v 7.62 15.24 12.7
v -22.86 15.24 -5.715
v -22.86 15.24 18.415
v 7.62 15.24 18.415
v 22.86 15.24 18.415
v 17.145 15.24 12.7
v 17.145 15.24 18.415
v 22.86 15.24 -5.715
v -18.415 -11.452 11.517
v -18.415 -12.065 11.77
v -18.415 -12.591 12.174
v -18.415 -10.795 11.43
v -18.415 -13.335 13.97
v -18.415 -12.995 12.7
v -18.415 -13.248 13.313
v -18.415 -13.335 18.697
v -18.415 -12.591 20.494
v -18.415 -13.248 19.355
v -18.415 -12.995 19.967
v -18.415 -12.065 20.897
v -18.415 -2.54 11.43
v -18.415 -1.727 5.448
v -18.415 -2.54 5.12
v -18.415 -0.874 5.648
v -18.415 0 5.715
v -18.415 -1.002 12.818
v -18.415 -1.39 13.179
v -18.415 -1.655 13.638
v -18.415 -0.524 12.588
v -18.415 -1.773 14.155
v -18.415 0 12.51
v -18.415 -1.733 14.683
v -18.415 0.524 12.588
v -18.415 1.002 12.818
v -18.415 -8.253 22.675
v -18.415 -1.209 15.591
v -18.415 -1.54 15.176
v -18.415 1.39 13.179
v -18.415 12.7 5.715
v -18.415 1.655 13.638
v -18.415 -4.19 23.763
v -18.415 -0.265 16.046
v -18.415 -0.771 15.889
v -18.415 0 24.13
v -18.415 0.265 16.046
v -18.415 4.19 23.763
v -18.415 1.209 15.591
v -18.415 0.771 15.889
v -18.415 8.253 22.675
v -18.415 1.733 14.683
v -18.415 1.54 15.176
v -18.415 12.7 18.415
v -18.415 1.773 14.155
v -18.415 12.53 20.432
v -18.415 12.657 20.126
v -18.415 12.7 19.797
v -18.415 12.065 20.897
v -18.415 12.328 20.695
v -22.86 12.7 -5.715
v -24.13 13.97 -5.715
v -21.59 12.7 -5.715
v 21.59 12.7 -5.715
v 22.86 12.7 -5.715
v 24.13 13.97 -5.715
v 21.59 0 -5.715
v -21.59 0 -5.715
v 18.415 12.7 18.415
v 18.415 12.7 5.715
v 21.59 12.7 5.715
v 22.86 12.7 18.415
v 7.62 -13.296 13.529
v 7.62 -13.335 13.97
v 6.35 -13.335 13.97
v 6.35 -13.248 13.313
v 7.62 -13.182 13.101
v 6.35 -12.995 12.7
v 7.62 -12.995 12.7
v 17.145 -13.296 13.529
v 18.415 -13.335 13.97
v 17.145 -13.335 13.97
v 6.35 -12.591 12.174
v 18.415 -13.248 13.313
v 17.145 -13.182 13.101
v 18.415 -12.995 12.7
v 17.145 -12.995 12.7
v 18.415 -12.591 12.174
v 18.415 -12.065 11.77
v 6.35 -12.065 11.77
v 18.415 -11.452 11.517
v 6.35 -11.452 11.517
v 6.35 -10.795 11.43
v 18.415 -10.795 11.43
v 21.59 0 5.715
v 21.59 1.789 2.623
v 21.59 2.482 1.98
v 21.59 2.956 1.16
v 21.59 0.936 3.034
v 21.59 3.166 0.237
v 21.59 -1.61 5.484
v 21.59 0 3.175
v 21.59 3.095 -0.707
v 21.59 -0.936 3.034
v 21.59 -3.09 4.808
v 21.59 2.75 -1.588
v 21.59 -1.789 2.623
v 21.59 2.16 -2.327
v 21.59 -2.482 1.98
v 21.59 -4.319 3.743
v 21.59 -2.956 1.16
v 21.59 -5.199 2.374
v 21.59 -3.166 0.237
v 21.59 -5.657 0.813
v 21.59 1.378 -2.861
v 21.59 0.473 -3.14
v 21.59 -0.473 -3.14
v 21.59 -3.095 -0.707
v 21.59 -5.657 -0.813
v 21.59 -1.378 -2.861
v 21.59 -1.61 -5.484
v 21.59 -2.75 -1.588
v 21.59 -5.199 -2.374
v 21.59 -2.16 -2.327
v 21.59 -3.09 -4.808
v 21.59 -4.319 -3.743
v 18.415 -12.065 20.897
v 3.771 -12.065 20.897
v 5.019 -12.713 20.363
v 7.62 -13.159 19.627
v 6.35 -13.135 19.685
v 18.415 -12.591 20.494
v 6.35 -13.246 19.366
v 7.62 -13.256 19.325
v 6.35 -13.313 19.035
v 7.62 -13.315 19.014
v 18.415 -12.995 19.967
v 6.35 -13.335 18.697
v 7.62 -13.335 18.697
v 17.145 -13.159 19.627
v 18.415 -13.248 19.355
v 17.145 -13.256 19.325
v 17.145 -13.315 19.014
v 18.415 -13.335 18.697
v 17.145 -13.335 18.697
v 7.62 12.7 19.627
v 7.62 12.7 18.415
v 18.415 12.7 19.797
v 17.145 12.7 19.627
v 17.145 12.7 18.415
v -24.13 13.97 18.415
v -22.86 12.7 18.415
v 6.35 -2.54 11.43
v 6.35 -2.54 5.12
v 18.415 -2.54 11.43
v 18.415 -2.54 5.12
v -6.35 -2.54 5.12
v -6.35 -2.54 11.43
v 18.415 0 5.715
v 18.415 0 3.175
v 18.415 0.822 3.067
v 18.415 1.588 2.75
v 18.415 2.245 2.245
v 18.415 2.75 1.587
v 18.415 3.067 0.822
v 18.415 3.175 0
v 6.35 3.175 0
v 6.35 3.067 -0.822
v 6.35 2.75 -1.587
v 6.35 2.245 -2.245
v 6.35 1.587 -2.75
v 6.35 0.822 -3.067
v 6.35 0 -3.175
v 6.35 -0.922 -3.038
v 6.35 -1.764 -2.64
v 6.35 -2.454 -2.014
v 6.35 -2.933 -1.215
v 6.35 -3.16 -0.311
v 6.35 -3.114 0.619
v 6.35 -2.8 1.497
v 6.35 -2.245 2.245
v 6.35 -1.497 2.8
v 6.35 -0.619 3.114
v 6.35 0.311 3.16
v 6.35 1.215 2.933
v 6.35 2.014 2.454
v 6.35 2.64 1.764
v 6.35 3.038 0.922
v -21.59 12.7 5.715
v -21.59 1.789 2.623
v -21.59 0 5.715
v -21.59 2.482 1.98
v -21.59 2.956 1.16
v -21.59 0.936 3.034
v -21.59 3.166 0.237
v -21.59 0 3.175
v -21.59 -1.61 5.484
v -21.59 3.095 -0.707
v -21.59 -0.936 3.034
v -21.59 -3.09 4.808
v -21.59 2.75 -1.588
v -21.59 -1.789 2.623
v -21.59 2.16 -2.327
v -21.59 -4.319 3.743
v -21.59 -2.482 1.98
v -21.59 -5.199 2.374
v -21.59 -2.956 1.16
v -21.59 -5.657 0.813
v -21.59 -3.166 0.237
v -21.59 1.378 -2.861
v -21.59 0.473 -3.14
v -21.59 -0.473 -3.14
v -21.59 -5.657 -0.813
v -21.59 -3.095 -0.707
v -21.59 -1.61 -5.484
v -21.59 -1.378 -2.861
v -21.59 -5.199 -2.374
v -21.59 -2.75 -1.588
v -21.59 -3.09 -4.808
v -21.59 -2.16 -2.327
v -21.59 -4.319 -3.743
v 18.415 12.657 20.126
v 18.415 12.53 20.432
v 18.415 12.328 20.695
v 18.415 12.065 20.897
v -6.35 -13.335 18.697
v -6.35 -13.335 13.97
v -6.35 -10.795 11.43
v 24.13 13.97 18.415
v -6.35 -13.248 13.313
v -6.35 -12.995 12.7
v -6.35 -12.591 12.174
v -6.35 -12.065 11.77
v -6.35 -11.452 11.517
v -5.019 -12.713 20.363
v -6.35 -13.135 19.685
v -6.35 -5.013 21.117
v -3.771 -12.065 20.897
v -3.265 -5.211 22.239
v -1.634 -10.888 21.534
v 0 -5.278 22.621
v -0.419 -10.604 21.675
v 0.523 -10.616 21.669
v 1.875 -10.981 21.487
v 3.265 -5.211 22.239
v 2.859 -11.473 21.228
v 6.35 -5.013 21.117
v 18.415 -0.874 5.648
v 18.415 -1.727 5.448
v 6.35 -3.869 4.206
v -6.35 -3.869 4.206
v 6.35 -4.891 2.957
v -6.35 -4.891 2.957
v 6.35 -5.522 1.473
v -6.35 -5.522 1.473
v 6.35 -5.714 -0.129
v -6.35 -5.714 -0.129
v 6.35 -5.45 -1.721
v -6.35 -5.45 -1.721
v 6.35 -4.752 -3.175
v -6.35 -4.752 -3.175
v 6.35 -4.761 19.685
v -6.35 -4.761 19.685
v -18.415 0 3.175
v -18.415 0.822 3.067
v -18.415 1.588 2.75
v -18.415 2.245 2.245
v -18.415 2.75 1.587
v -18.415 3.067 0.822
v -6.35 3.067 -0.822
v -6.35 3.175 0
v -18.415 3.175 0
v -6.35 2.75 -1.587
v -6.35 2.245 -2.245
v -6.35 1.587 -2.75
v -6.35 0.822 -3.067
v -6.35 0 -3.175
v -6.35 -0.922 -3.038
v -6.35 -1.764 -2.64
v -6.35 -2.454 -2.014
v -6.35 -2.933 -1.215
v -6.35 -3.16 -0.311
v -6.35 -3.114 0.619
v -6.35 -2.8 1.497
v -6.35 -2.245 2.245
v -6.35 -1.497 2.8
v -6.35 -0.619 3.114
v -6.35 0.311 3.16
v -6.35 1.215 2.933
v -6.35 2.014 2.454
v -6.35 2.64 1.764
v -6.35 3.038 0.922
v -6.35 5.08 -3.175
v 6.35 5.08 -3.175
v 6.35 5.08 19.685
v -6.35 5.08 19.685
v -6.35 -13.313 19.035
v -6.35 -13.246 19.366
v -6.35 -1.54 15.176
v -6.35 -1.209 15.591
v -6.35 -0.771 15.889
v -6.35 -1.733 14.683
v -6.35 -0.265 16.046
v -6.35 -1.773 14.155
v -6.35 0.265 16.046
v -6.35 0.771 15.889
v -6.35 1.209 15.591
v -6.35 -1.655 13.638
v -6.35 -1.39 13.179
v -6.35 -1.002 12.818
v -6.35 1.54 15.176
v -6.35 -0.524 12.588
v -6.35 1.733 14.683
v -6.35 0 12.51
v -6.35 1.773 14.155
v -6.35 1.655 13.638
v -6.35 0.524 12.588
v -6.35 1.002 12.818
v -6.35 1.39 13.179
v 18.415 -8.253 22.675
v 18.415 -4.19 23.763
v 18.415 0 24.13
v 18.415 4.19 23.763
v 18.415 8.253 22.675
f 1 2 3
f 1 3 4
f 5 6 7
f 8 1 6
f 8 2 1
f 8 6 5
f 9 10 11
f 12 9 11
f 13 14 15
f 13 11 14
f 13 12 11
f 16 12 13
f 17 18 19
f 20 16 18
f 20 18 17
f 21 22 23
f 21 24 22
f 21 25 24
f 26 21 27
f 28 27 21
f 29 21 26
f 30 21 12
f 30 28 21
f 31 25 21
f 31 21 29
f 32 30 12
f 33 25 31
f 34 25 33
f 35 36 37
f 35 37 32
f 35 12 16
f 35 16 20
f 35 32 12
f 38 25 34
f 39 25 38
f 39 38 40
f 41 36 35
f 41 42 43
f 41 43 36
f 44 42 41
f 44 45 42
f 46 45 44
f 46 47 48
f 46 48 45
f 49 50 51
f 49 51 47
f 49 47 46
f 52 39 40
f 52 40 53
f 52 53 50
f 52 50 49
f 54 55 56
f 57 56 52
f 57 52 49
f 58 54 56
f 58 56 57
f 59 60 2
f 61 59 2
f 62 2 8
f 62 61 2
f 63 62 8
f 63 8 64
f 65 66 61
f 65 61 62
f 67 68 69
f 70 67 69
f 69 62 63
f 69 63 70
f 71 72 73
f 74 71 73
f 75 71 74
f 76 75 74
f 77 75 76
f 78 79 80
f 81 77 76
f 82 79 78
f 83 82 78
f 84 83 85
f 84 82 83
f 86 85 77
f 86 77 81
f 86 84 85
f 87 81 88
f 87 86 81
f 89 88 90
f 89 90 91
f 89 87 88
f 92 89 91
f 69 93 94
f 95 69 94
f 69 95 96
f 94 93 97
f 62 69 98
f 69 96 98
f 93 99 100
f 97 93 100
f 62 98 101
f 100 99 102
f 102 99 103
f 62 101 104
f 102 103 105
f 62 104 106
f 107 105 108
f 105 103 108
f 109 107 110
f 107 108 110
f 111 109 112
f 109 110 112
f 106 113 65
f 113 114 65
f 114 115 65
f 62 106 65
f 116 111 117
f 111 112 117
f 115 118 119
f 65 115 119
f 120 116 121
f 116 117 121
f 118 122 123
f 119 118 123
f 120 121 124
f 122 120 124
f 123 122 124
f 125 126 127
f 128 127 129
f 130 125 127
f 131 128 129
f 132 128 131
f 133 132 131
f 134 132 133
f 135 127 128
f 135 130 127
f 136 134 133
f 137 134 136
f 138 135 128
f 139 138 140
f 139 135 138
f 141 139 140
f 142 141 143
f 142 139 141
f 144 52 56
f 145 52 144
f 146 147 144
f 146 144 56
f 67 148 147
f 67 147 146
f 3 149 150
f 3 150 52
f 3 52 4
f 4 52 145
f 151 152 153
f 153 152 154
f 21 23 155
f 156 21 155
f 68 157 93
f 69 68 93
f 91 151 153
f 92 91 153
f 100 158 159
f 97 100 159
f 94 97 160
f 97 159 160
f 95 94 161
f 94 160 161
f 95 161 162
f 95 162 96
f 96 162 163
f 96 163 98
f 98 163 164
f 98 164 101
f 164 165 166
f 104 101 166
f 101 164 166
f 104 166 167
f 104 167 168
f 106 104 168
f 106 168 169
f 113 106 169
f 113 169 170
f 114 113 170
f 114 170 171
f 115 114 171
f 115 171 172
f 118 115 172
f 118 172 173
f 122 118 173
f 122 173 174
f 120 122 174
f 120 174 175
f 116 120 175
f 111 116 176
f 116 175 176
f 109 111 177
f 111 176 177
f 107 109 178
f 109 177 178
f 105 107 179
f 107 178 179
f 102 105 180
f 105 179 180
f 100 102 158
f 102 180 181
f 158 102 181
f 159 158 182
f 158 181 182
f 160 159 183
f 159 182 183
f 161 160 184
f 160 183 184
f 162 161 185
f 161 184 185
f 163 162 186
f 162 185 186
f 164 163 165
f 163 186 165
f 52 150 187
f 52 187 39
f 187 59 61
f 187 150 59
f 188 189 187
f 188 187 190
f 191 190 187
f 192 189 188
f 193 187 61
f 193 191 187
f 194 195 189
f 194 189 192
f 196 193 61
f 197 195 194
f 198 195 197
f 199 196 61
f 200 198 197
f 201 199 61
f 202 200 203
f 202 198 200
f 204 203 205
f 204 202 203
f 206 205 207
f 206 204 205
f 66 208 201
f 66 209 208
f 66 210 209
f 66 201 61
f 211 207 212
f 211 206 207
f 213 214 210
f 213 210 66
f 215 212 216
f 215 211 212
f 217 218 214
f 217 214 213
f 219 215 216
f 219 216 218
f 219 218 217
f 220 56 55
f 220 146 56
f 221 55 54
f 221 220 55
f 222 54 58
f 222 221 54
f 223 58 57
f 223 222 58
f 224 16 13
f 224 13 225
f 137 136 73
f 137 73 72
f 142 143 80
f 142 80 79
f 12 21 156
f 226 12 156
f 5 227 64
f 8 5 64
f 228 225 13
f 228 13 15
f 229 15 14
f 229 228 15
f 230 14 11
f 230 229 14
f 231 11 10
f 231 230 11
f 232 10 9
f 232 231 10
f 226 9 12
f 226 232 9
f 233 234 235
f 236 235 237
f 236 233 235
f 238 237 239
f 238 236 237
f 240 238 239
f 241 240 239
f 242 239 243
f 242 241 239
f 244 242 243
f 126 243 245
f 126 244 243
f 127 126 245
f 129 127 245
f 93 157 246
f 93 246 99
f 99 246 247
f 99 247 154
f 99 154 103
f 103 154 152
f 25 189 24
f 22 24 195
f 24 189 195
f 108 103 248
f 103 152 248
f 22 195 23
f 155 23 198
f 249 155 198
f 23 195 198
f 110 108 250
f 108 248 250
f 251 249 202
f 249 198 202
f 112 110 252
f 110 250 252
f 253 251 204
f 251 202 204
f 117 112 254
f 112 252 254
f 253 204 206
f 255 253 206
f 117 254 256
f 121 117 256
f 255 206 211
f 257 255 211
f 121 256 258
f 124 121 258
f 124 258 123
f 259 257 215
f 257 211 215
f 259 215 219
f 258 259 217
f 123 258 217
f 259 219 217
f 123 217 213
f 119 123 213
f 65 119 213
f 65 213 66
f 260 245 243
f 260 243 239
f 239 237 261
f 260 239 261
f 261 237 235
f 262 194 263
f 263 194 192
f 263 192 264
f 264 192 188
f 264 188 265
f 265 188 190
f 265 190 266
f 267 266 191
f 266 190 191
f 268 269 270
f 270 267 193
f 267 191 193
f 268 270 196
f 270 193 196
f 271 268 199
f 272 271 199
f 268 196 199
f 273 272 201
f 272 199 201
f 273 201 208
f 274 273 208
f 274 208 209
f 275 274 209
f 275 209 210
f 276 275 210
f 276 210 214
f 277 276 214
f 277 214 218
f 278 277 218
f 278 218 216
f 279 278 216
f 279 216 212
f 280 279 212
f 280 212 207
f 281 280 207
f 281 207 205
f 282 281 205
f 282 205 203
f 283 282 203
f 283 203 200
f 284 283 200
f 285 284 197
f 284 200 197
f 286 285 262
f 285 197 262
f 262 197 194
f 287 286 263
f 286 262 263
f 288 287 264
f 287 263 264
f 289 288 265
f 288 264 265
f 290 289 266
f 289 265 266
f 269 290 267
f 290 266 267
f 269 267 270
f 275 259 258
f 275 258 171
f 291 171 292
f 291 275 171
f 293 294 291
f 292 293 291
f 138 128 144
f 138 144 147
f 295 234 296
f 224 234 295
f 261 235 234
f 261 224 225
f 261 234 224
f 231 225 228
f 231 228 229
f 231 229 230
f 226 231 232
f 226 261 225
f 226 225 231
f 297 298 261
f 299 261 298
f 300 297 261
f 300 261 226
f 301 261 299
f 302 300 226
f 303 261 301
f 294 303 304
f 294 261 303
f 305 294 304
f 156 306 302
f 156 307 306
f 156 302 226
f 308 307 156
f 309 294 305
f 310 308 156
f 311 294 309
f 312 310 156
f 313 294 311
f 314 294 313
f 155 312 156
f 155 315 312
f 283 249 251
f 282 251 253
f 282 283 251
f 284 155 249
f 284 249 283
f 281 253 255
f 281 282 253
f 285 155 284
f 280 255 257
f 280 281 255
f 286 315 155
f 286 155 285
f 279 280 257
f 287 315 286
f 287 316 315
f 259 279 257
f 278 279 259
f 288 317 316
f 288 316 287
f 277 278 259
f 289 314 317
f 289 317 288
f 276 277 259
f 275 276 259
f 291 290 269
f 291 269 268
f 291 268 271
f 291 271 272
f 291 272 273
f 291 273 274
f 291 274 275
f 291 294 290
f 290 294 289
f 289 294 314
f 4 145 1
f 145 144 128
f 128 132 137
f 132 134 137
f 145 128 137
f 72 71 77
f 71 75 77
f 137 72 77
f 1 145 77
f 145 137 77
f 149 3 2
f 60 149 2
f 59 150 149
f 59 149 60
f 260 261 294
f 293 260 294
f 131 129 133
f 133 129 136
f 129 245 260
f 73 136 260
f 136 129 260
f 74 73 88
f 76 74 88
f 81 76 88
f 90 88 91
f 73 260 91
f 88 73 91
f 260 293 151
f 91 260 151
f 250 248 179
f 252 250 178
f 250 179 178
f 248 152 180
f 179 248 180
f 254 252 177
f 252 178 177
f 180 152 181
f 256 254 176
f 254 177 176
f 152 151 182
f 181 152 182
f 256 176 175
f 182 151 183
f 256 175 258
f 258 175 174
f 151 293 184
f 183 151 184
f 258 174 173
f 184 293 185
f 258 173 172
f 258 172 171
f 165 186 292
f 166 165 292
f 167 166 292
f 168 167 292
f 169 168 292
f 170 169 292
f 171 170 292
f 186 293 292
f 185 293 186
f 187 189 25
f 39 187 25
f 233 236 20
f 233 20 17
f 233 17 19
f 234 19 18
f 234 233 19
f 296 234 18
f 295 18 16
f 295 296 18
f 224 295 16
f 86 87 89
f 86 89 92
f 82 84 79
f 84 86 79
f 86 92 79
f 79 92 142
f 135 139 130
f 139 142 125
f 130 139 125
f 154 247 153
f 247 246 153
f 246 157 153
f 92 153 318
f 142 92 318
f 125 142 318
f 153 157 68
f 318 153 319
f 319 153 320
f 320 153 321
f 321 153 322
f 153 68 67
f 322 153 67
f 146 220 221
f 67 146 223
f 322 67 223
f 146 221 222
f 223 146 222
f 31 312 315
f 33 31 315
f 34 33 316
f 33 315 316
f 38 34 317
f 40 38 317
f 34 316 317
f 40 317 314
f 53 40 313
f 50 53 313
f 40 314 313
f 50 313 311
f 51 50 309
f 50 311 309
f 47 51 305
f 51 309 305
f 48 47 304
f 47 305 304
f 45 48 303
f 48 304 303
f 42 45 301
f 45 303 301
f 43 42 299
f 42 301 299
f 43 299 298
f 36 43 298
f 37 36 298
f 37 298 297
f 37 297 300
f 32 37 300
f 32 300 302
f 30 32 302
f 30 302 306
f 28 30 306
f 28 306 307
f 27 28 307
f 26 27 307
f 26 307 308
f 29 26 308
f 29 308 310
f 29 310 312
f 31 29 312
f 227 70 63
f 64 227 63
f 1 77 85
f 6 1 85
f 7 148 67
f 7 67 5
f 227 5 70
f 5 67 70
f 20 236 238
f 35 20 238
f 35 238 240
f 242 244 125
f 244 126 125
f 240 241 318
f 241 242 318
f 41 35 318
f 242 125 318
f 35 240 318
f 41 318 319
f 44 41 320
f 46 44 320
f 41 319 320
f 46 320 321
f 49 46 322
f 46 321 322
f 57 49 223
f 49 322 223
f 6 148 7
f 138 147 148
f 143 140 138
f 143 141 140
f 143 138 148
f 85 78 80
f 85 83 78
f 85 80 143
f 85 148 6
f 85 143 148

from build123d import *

# Parameters (mm, degrees)
BOSS_EXTRUDE1_DEPTH      = 21.59
BOSS_EXTRUDE1_DEPTH_BACK = 21.59
SKETCH1_R                = 5.715
SKETCH3_W                = 43.18
SKETCH3_H                = 11.43
BOSS_EXTRUDE3_DEPTH      = 12.7
SKETCH4_W                = 36.83
SKETCH4_H                = 15.24
BOSS_EXTRUDE4_DEPTH      = 24.13
SKETCH7_W                = 36.83
SKETCH7_H                = 12.7
BOSS_EXTRUDE5_DEPTH      = 10.795
SKETCH5_R                = 3.175
CUT_EXTRUDE1_DEPTH       = 52.230767367
CUT_EXTRUDE5_DEPTH       = 52.230767367
FILLET1_R                = 2.54
CUT_EXTRUDE6_DEPTH       = 6.35
CUT_EXTRUDE6_DEPTH_BACK  = 6.35
SKETCH10_W               = 22.86
SKETCH10_H               = 25.4
SKETCH11_R               = 1.778
CUT_EXTRUDE7_DEPTH       = 36.017241825
SKETCH24_W               = 48.26
SKETCH24_H               = 24.13
BOSS_EXTRUDE6_DEPTH      = 2.54
SKETCH17_W               = 12.7
SKETCH17_H               = 3.175
CUT_EXTRUDE9_DEPTH       = 8.89
SKETCH18_W               = 9.525
SKETCH18_H               = 6.927192993
CUT_EXTRUDE13_DEPTH      = 45.508925283
CHAMFER1_SIZE            = 1.27
FILLET2_R                = 1.27


with BuildPart() as part:
    # Sketch1 → Boss-Extrude1 (new, two sides: drawn at the far end of the back side and taken through both)
    with BuildSketch(Plane(origin=(0, 0, 0), x_dir=(0, 0, -1), z_dir=(1, 0, 0)).offset(-BOSS_EXTRUDE1_DEPTH_BACK)):
        Circle(SKETCH1_R)
    extrude(amount=BOSS_EXTRUDE1_DEPTH + BOSS_EXTRUDE1_DEPTH_BACK)

    # Sketch3 → Boss-Extrude3 (add)
    with BuildSketch(Plane(origin=(0, 0, 0), x_dir=(1, 0, 0), z_dir=(0, 1, 0))):
        Rectangle(SKETCH3_W, SKETCH3_H)
    extrude(amount=BOSS_EXTRUDE3_DEPTH)


with BuildPart() as body_2:
    # Sketch4 → Boss-Extrude4 (new body)
    with BuildSketch(Plane.XY):
        with Locations((0, 5.08)):
            Rectangle(SKETCH4_W, SKETCH4_H)
    extrude(amount=BOSS_EXTRUDE4_DEPTH)


with BuildPart() as body_3:
    # Sketch7 → Boss-Extrude5 (new body)
    with BuildSketch(Plane.XZ.offset(2.54)):
        with Locations((0, 17.78)):
            Rectangle(SKETCH7_W, SKETCH7_H)
    extrude(amount=BOSS_EXTRUDE5_DEPTH)


with BuildPart() as cut_extrude1_tool:
    # Sketch5 → Cut-Extrude1 (new, through all)
    with BuildSketch(Plane.ZY.offset(21.59)):
        Circle(SKETCH5_R)
    extrude(amount=-CUT_EXTRUDE1_DEPTH)


with BuildPart() as part_1:
    add(part.part)

    # Cut-Extrude1: cut by cut_extrude1_tool
    add(cut_extrude1_tool.part, mode=Mode.SUBTRACT)


with BuildPart() as body_2_1:
    add(body_2.part)

    # Cut-Extrude1: cut by cut_extrude1_tool
    add(cut_extrude1_tool.part, mode=Mode.SUBTRACT)


with BuildPart() as cut_extrude5_tool:
    # Sketch6 → Cut-Extrude5 (new, through all)
    with BuildSketch(Plane(origin=(21.59, 0, 0), x_dir=(0, 0, -1), z_dir=(1, 0, 0))):
        with BuildLine():
            ThreePointArc((-19.445417037, -14.2875), (-24.13, 0), (-19.445417037, 14.2875))
            Line((-19.445417037, 14.2875), (-27.94, 14.2875))
            Line((-27.94, 14.2875), (-27.94, -14.2875))
            Line((-27.94, -14.2875), (-19.445417037, -14.2875))
        make_face()
    extrude(amount=-CUT_EXTRUDE5_DEPTH)


with BuildPart() as body_2_2:
    add(body_2_1.part)

    # Cut-Extrude5: cut by cut_extrude5_tool
    add(cut_extrude5_tool.part, mode=Mode.SUBTRACT)


with BuildPart() as body_3_1:
    add(body_3.part)

    # Cut-Extrude5: cut by cut_extrude5_tool
    add(cut_extrude5_tool.part, mode=Mode.SUBTRACT)

    # Fillet1
    fillet1_edges = [body_3_1.edges().sort_by_distance(p)[0] for p in [
        (0, -13.335, 20.11056128),
        (0, -13.335, 11.43),
    ]]
    fillet(fillet1_edges, radius=FILLET1_R)


with BuildPart() as cut_extrude6_tool:
    # Sketch10 → Cut-Extrude6 (new, two sides: drawn at the far end of the back side and taken through both)
    with BuildSketch(Plane(origin=(0, 0, 0), x_dir=(0, 0, -1), z_dir=(1, 0, 0)).offset(-CUT_EXTRUDE6_DEPTH_BACK)):
        with Locations((-8.255, -7.62)):
            Rectangle(SKETCH10_W, SKETCH10_H)
    extrude(amount=CUT_EXTRUDE6_DEPTH + CUT_EXTRUDE6_DEPTH_BACK)


with BuildPart() as part_2:
    add(part_1.part)

    # Cut-Extrude6: cut by cut_extrude6_tool
    add(cut_extrude6_tool.part, mode=Mode.SUBTRACT)


with BuildPart() as body_2_3:
    add(body_2_2.part)

    # Cut-Extrude6: cut by cut_extrude6_tool
    add(cut_extrude6_tool.part, mode=Mode.SUBTRACT)

    # Sketch11 → Cut-Extrude7 (cut, through all)
    with BuildSketch(Plane(origin=(0, 0, 0), x_dir=(0, 0, -1), z_dir=(1, 0, 0))):
        with Locations((-14.2875, 0)):
            Circle(SKETCH11_R)
    extrude(amount=-CUT_EXTRUDE7_DEPTH, mode=Mode.SUBTRACT)


with BuildPart() as body_3_2:
    add(body_3_1.part)

    # Cut-Extrude6: cut by cut_extrude6_tool
    add(cut_extrude6_tool.part, mode=Mode.SUBTRACT)


with BuildPart() as body_2_4:
    add(body_2_3.part)

    # Combine1: union body 3, part
    add(body_3_2.part)
    add(part_2.part)

    # Sketch24 → Boss-Extrude6 (add)
    with BuildSketch(Plane(origin=(0, 12.7, 0), x_dir=(1, 0, 0), z_dir=(0, 1, 0))):
        with Locations((0, -6.35)):
            Rectangle(SKETCH24_W, SKETCH24_H)
    extrude(amount=BOSS_EXTRUDE6_DEPTH)

    # Sketch17 → Cut-Extrude9 (cut)
    with BuildSketch(Plane(origin=(0, -10.005646771, -1.764265485), x_dir=(-1, 0, 0), z_dir=(0, 0.984807753012208, 0.17364817766693072))):
        with BuildLine():
            Line((-6.35, 21.666839892), (6.35, 21.666839892))
            ThreePointArc((6.35, 21.666839892), (0, 23.193431999), (-6.35, 21.666839892))
        make_face()
        with Locations((0, 20.079339892)):
            Rectangle(SKETCH17_W, SKETCH17_H)
    extrude(amount=CUT_EXTRUDE9_DEPTH, mode=Mode.SUBTRACT)

    # Sketch18 → Cut-Extrude13 (cut, through all)
    with BuildSketch(Plane(origin=(0, -13.335, 0), x_dir=(1, 0, 0), z_dir=(0, 1, 0))):
        with Locations((12.3825, -16.163596497)):
            Rectangle(SKETCH18_W, SKETCH18_H)
    extrude(amount=CUT_EXTRUDE13_DEPTH, mode=Mode.SUBTRACT)

    # Chamfer1
    chamfer1_edges = [body_2_4.edges().sort_by_distance(p)[0] for p in [
        (24.13, 15.24, 6.35),
        (24.13, 12.7, 6.35),
        (-24.13, 15.24, 6.35),
        (-24.13, 12.7, 6.35),
    ]]
    chamfer(chamfer1_edges, length=CHAMFER1_SIZE - 0.0001)  # a hair under: the kernel refuses the full size

    # Fillet2
    fillet2_edges = [body_2_4.edges().sort_by_distance(p)[0] for p in [
        (0, 12.7, 20.517477915),
    ]]
    fillet(fillet2_edges, radius=FILLET2_R)


solid = body_2_4.part
